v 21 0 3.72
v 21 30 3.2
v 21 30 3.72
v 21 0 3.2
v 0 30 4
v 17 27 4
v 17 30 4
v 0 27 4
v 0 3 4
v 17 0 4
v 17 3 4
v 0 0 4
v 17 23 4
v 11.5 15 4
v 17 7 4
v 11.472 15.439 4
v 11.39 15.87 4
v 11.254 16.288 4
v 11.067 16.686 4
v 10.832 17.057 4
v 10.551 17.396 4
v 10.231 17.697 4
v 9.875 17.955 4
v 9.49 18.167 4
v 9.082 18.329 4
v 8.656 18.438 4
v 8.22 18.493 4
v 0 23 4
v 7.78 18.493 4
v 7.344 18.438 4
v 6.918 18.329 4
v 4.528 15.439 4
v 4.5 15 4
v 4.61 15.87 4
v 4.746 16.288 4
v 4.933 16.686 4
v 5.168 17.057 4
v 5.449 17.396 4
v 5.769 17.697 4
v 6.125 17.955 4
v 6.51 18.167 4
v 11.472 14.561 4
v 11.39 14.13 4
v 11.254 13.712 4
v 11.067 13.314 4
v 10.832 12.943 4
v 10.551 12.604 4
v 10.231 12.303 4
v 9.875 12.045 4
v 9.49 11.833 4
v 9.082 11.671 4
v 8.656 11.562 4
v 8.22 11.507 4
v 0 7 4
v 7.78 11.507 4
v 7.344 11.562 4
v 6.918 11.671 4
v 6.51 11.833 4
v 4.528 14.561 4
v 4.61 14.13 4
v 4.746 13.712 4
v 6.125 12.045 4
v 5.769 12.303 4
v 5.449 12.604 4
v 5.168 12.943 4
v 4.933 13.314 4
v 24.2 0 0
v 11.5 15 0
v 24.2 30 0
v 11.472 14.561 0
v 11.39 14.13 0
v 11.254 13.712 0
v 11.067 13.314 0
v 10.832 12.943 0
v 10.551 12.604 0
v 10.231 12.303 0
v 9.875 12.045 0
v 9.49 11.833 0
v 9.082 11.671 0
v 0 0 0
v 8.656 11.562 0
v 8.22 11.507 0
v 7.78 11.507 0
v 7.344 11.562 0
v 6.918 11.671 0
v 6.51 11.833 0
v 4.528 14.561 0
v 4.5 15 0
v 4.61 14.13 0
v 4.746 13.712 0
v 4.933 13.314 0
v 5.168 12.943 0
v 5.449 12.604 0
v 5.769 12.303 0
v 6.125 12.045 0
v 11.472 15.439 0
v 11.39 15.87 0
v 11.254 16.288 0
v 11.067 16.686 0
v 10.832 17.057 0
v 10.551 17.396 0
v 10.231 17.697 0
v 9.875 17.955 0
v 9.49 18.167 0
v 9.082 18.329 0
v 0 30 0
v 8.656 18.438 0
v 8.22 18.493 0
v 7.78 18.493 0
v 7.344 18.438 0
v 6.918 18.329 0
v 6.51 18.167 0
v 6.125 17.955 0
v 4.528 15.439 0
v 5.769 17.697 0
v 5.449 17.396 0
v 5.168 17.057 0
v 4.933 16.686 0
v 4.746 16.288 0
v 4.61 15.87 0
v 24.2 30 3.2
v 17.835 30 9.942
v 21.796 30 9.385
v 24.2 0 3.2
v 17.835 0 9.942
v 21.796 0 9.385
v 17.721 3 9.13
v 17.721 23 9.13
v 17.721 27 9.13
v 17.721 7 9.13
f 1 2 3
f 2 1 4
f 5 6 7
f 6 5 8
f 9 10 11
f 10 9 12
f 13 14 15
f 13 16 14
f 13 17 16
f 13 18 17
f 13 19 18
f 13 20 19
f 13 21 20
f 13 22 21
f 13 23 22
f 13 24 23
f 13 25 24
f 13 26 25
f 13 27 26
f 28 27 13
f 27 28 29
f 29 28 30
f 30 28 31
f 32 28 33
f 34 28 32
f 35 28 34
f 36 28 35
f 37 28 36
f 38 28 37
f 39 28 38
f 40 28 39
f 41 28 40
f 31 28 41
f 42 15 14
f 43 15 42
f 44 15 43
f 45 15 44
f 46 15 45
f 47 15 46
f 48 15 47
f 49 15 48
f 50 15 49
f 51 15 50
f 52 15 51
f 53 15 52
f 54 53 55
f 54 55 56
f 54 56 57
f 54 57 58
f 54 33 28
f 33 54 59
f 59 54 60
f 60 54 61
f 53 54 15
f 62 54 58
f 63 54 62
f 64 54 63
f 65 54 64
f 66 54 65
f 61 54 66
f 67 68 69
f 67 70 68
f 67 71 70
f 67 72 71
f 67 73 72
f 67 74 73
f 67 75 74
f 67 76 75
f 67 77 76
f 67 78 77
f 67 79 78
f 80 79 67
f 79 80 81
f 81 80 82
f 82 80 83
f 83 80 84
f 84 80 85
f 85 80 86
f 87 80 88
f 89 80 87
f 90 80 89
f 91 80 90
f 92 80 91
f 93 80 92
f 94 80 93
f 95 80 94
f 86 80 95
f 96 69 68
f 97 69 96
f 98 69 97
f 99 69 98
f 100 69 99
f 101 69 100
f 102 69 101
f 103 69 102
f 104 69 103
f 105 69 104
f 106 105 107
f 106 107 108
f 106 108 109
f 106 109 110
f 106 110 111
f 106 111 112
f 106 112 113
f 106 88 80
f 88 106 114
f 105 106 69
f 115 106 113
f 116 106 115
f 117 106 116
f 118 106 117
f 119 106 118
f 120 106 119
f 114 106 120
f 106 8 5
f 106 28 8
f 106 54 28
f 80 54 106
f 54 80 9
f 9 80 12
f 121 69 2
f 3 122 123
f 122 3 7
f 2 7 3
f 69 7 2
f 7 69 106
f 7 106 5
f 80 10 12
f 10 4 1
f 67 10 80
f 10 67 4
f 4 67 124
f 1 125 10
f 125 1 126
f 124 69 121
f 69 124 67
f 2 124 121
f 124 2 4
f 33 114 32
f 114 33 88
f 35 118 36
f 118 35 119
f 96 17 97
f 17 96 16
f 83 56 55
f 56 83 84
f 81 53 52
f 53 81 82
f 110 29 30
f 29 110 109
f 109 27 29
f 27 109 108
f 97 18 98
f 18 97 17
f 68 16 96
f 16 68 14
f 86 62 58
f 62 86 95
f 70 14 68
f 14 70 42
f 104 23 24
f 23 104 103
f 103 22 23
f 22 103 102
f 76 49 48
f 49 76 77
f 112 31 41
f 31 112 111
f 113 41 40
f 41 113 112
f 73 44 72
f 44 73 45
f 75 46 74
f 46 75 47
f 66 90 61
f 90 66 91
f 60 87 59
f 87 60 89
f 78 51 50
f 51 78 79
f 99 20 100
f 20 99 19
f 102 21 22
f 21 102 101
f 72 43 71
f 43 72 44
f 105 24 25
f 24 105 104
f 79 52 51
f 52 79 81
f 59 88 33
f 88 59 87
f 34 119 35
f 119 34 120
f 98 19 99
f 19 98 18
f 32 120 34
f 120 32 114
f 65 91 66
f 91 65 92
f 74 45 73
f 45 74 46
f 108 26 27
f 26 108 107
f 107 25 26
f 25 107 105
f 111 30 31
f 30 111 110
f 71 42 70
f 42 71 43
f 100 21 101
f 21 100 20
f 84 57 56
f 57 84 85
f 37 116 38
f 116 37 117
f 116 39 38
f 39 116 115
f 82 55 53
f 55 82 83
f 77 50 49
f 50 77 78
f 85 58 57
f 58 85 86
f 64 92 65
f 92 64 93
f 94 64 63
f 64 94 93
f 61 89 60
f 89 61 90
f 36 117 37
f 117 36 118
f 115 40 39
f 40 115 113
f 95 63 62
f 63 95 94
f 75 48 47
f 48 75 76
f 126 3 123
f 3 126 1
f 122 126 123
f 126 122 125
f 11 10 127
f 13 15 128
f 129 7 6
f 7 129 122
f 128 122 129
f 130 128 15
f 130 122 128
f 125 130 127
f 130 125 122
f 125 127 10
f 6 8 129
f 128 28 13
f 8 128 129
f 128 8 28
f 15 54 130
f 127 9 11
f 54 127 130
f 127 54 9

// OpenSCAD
// height of clamp
clampHeight=10; // [10:0.2:50]

// width of clamp
clampWidth=30; // [20:50]

// depth of clamp
clampDepth=4; // [1.5:0.1:8]

// angle of clamp
clampAngle=8; // [0:0.1:20]

// hole diameter
holeDiameter=7; // [5:0.1:9]

// table offset
tableRiseOffset=3.2;

// material support height
materialSupportHeight=3.2;

/* hidden */
module hiden() {}
holeDiaMultiplier=3;
$fn = 50;

module bottomPlate() {
  difference() {
    union() {
      cube ([holeDiameter*holeDiaMultiplier,clampWidth,clampDepth]); 
      translate ([holeDiameter*holeDiaMultiplier, 0, 0]) cube ([materialSupportHeight,clampWidth,tableRiseOffset]);
    }
    translate([holeDiameter+clampDepth/4, clampWidth/2, -0.1]) cylinder (d=holeDiameter,h=clampDepth+0.2);
  }
}

module enforcement() {
  rotate([90,0,0])
  linear_extrude (height=clampDepth)
  polygon (points=[[0,0],[holeDiameter*holeDiaMultiplier-clampDepth/2,0],[holeDiameter*holeDiaMultiplier-clampDepth/2, clampHeight-clampDepth-0.5]]);   
}

module verticalPlate() {
  rotate ([0,clampAngle,0]) cube ([clampDepth,clampWidth,clampHeight-clampDepth]);
}

module clamp() {
  union() {
    bottomPlate();
    translate([holeDiameter*holeDiaMultiplier-clampDepth,0,clampDepth]) verticalPlate();
    enfOff=clampWidth-holeDiameter;
    translate([0,clampDepth+enfOff,clampDepth]) enforcement();
    translate([0,clampWidth-enfOff,clampDepth]) enforcement();
  }
}

clamp();
